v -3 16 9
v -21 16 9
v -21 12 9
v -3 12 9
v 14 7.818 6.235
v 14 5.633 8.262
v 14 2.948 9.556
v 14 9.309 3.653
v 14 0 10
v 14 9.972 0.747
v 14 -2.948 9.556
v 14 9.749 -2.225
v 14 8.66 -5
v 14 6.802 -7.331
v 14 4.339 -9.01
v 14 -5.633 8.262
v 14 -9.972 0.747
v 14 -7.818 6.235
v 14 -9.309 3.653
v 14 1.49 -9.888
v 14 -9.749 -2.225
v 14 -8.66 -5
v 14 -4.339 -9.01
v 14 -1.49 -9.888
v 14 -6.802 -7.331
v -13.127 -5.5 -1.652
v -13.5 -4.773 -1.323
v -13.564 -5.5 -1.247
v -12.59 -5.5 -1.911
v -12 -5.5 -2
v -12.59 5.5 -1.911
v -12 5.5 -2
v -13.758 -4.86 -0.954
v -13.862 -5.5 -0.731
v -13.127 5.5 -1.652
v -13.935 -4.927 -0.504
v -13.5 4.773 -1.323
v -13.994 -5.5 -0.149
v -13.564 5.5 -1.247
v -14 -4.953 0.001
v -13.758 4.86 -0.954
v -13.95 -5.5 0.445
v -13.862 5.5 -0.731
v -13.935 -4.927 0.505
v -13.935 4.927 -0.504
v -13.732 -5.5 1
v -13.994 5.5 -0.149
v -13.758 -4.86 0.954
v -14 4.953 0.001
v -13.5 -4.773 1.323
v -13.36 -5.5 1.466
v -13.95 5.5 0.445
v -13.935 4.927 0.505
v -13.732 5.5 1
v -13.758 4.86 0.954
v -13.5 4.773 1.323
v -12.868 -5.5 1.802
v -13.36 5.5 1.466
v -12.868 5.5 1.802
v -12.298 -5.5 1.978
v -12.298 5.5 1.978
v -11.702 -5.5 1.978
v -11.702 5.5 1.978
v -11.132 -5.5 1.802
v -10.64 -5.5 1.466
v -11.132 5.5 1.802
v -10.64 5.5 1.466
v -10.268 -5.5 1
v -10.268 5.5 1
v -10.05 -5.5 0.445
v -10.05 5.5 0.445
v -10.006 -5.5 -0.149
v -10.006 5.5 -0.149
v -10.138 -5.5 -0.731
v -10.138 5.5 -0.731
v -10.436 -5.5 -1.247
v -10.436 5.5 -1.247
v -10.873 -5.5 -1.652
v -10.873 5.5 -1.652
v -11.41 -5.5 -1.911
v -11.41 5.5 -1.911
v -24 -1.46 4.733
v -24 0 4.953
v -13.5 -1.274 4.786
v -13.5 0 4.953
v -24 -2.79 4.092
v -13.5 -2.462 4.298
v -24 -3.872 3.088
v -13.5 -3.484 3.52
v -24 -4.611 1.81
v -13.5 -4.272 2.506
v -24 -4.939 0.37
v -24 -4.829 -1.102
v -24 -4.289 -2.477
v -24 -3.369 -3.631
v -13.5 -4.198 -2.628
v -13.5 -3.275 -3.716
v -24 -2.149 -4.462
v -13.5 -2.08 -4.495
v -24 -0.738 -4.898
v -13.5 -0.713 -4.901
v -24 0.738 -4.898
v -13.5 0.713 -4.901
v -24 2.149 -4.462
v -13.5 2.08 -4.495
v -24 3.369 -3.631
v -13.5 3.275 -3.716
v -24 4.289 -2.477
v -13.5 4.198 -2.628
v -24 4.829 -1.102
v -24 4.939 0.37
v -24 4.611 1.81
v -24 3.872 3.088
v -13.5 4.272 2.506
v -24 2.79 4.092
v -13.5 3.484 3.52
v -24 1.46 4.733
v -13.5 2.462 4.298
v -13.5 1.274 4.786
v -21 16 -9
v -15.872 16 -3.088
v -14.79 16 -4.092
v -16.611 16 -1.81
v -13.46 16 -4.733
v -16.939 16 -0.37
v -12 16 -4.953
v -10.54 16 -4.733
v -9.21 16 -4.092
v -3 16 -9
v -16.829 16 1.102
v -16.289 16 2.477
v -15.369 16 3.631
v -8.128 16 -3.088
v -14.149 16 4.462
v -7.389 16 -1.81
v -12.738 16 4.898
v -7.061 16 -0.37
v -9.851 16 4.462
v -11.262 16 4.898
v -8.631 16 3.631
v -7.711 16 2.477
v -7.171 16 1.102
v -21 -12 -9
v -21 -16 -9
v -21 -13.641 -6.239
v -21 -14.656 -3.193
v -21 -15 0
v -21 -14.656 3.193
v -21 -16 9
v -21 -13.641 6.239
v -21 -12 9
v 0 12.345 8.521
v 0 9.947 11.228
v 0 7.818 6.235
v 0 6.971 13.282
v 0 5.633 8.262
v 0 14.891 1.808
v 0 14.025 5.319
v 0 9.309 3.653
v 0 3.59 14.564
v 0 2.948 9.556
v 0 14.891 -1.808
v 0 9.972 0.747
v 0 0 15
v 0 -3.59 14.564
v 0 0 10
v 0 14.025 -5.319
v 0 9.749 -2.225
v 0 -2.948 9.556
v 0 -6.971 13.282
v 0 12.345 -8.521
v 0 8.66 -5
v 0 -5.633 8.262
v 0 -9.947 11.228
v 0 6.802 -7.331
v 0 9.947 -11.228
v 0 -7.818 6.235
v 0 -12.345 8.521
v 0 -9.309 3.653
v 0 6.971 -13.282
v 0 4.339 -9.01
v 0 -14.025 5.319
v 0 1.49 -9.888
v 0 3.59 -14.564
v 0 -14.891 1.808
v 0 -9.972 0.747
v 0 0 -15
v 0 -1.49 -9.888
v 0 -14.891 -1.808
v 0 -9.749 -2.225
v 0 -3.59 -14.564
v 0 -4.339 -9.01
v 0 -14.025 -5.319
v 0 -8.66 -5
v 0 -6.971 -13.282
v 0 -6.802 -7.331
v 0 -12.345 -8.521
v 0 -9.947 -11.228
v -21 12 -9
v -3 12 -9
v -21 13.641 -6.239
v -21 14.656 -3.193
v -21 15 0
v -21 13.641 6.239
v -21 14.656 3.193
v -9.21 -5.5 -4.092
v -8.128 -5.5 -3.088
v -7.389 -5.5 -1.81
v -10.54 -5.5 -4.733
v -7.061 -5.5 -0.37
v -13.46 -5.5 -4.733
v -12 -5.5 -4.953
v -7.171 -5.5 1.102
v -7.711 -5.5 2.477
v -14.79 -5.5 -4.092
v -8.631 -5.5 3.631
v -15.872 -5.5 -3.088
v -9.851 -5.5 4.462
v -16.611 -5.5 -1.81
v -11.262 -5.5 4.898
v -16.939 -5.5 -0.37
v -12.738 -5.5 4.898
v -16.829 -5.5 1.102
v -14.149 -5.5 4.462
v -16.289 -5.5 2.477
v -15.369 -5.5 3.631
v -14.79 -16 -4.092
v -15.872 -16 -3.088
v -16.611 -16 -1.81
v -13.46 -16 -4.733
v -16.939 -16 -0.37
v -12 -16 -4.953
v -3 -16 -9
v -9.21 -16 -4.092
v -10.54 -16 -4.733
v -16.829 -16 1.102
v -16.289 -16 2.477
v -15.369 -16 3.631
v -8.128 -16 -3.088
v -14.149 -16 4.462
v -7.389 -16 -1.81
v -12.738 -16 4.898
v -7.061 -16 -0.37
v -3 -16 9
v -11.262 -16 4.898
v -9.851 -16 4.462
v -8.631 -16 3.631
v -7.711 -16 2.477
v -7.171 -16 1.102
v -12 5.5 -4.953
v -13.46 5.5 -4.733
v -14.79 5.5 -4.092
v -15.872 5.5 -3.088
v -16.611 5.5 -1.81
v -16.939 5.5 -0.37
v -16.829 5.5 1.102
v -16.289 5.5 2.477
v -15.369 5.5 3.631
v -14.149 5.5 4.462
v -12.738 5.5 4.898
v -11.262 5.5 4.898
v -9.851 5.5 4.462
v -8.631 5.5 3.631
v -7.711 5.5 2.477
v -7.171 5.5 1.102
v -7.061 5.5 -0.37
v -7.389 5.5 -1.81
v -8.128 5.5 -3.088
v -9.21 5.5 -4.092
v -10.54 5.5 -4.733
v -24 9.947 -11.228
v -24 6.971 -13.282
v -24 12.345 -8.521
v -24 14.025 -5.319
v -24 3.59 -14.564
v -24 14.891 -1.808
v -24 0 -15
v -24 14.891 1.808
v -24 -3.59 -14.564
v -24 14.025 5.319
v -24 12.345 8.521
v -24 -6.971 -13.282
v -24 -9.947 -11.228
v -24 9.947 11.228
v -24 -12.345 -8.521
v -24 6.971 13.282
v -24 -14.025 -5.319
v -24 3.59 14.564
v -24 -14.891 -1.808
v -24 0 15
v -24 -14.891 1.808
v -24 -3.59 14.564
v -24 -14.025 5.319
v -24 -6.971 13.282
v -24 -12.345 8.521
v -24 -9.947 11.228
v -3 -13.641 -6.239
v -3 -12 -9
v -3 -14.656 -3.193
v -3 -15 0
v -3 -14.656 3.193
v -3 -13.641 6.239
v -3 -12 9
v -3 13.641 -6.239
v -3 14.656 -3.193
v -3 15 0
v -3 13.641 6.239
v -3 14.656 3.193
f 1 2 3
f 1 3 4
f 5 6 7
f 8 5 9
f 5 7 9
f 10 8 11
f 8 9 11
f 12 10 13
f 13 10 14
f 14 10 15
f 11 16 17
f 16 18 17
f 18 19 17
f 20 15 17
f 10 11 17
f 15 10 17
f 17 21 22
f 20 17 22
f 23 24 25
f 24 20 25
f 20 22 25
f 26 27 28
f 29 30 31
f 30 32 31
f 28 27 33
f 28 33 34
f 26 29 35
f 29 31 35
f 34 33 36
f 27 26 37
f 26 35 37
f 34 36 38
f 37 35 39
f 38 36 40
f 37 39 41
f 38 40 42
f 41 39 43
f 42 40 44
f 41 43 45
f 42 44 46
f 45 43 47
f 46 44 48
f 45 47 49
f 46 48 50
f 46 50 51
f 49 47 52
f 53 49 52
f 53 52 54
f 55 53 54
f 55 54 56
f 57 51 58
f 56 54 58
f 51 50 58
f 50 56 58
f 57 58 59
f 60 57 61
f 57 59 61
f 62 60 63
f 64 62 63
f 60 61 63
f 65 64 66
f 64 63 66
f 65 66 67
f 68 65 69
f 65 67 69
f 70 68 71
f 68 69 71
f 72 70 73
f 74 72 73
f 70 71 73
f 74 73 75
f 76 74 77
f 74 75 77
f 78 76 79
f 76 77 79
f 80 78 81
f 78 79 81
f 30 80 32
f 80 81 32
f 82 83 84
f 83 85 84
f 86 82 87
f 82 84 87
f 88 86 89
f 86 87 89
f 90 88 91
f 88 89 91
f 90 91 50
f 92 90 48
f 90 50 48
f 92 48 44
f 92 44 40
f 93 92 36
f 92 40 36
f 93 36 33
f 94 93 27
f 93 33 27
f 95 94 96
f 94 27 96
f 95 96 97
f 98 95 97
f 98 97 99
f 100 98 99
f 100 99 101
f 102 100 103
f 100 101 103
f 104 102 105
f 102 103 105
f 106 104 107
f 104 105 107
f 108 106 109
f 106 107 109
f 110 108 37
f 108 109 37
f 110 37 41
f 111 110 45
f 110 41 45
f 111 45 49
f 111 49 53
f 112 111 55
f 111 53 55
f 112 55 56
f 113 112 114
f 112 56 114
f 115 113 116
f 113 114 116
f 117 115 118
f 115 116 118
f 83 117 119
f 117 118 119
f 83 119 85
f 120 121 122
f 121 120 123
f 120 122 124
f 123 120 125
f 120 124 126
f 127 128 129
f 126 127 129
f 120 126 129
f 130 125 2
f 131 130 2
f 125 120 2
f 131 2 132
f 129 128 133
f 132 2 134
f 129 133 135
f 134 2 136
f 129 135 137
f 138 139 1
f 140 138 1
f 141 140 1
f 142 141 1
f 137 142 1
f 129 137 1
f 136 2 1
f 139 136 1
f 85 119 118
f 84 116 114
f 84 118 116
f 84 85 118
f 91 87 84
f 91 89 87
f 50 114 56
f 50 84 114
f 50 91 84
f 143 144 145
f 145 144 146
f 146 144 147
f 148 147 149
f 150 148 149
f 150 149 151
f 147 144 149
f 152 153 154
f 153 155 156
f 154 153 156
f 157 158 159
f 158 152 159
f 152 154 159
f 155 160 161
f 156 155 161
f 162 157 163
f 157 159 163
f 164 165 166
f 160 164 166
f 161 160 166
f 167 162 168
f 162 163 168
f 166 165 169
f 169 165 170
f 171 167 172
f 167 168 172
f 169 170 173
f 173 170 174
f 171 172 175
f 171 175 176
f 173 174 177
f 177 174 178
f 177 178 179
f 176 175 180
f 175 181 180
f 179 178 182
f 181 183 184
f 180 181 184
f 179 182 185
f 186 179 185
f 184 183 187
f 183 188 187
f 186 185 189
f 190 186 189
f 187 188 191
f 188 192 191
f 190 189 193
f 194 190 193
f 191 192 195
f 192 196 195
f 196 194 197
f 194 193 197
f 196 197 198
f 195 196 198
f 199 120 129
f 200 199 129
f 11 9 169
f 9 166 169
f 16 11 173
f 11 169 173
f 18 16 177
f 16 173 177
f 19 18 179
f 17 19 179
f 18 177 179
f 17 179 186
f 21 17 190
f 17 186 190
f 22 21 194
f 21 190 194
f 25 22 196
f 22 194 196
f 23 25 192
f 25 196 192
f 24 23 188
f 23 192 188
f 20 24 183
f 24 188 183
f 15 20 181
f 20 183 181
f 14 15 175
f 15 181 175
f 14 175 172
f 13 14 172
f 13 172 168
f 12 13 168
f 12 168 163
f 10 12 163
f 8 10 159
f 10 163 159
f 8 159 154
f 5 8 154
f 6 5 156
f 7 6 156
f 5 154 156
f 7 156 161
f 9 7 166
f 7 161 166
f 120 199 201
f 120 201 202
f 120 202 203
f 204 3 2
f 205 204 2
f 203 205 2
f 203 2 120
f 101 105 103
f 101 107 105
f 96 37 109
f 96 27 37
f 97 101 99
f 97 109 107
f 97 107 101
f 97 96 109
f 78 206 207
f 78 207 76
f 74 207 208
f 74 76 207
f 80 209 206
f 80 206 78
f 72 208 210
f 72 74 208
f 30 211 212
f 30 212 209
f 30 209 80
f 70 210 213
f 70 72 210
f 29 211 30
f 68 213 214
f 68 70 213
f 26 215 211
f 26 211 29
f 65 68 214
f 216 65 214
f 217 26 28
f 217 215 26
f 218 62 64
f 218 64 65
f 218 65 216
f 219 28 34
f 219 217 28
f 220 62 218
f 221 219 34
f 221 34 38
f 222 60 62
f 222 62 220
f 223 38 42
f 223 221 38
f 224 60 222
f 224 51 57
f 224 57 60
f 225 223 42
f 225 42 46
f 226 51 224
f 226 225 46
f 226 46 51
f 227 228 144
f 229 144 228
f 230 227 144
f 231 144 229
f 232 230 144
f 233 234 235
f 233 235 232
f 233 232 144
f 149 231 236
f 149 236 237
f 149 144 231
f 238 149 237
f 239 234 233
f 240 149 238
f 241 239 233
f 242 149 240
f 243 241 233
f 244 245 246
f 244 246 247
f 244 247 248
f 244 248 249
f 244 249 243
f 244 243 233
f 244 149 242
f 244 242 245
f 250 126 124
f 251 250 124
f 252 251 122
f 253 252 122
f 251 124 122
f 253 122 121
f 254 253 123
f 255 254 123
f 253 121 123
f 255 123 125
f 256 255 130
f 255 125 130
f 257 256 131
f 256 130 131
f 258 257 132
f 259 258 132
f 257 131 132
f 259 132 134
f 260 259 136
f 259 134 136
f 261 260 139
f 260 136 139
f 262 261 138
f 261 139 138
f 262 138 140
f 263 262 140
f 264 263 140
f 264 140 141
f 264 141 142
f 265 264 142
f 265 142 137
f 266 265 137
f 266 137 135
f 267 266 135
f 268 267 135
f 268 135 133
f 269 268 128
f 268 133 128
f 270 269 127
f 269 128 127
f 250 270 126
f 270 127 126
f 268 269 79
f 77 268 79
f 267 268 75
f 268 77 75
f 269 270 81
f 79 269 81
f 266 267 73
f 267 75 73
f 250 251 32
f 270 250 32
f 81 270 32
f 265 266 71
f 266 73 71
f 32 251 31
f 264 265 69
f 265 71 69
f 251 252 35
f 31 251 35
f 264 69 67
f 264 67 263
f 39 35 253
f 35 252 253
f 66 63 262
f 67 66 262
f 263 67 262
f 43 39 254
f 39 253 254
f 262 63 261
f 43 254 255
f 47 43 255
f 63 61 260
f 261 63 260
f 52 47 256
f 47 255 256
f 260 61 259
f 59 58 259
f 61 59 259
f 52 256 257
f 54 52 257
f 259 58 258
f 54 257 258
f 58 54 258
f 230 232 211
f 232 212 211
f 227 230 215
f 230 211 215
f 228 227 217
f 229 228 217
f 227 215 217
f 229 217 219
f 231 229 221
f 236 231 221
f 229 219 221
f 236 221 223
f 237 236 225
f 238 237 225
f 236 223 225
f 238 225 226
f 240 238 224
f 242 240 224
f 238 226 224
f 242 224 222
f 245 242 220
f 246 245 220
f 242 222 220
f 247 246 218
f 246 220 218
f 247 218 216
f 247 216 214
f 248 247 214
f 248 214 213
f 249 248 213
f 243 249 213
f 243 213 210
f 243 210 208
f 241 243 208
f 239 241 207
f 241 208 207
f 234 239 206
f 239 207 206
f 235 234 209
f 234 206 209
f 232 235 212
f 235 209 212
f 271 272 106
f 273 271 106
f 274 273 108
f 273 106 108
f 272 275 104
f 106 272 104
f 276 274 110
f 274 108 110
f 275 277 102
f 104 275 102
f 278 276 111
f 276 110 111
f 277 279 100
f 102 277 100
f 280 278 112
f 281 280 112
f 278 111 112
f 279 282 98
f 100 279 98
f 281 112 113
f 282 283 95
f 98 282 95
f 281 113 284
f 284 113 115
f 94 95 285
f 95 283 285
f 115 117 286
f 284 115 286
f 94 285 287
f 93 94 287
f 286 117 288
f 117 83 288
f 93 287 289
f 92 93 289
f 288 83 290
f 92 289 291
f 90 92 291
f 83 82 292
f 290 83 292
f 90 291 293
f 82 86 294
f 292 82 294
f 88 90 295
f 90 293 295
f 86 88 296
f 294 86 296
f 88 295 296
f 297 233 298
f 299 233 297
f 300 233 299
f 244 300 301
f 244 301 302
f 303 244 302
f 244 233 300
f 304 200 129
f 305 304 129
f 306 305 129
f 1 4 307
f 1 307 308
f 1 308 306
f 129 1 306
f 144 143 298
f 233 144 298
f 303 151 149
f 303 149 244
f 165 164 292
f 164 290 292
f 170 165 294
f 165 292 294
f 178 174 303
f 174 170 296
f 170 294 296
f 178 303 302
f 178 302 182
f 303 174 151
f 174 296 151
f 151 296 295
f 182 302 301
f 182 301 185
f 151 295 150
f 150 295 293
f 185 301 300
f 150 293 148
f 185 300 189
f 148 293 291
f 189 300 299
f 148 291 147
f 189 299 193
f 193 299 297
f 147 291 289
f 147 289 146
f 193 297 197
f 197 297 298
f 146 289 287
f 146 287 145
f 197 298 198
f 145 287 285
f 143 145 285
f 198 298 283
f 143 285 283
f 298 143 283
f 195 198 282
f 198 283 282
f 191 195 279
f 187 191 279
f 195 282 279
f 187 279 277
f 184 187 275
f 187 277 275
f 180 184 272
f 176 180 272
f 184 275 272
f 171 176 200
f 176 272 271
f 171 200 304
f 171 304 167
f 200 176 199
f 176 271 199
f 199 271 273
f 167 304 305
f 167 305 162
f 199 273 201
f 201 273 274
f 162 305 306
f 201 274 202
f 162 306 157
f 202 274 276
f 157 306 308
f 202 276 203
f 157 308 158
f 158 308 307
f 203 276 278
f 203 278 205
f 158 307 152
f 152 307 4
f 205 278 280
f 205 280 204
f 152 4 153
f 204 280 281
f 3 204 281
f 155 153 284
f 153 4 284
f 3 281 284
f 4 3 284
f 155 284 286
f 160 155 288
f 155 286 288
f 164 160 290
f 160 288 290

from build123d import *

# Parameters (mm, degrees)
SIDE_BOSS_SKETCH_W      = 18
SIDE_BOSS_SKETCH_H      = 16
SIDE_BOSS_DEPTH         = 9
SIDE_BOSS_2_SKETCH_W    = 18
SIDE_BOSS_2_SKETCH_H    = 16
SIDE_BOSS_2_DEPTH       = 9
BOTTOM_PORT_SKETCH_W    = 11.5
BOTTOM_PORT_SKETCH_H    = 4.953
SIDE_PORT_SKETCH_W      = 4.953
SIDE_PORT_SKETCH_H      = 11.5
SIDE_PASSAGE_SKETCH_W   = 2
SIDE_PASSAGE_SKETCH_H   = 5.5
SIDE_PORT_2_SKETCH_W    = 4.953
SIDE_PORT_2_SKETCH_H    = 11.5
SIDE_PASSAGE_2_SKETCH_W = 2
SIDE_PASSAGE_2_SKETCH_H = 5.5


with BuildPart() as part:
    # Reg_Outlet_Adapter Sketch → Reg_Outlet_Adapter (revolve)
    with BuildSketch(Plane.XY):
        Polygon((14, 0), (14, 10), (0, 10), (0, 15), (-24, 15), (-24, 0), align=None)
    revolve(axis=Axis((-1000, 0, 0), (1, 0, 0)))

    # Side Boss Sketch → Side Boss (add, symmetric)
    with BuildSketch(Plane.XY):
        with Locations((-12, 8)):
            Rectangle(SIDE_BOSS_SKETCH_W, SIDE_BOSS_SKETCH_H)
    extrude(amount=SIDE_BOSS_DEPTH, both=True)

    # Side Boss 2 Sketch → Side Boss 2 (add, symmetric)
    with BuildSketch(Plane.XY):
        with Locations((-12, -8)):
            Rectangle(SIDE_BOSS_2_SKETCH_W, SIDE_BOSS_2_SKETCH_H)
    extrude(amount=SIDE_BOSS_2_DEPTH, both=True)

    # Bottom Port Sketch → Bottom Port (revolve, cut)
    with BuildSketch(Plane.XY):
        with Locations((-19.25, 2.4765)):
            Rectangle(BOTTOM_PORT_SKETCH_W, BOTTOM_PORT_SKETCH_H)
    revolve(axis=Axis((-1000, 0, 0), (1, 0, 0)), mode=Mode.SUBTRACT)

    # Side Port Sketch → Side Port (revolve, cut)
    with BuildSketch(Plane.XY):
        with Locations((-9.5235, 11.25)):
            Rectangle(SIDE_PORT_SKETCH_W, SIDE_PORT_SKETCH_H)
    revolve(axis=Axis((-12, -60, 0), (0, 1, 0)), mode=Mode.SUBTRACT)

    # Side Passage Sketch → Side Passage (revolve, cut)
    with BuildSketch(Plane.XY):
        with Locations((-11, 2.75)):
            Rectangle(SIDE_PASSAGE_SKETCH_W, SIDE_PASSAGE_SKETCH_H)
    revolve(axis=Axis((-12, -60, 0), (0, 1, 0)), mode=Mode.SUBTRACT)

    # Side Port 2 Sketch → Side Port 2 (revolve, cut)
    with BuildSketch(Plane.XY):
        with Locations((-9.5235, -11.25)):
            Rectangle(SIDE_PORT_2_SKETCH_W, SIDE_PORT_2_SKETCH_H)
    revolve(axis=Axis((-12, -60, 0), (0, 1, 0)), mode=Mode.SUBTRACT)

    # Side Passage 2 Sketch → Side Passage 2 (revolve, cut)
    with BuildSketch(Plane.XY):
        with Locations((-11, -2.75)):
            Rectangle(SIDE_PASSAGE_2_SKETCH_W, SIDE_PASSAGE_2_SKETCH_H)
    revolve(axis=Axis((-12, -60, 0), (0, 1, 0)), mode=Mode.SUBTRACT)


solid = part.part
